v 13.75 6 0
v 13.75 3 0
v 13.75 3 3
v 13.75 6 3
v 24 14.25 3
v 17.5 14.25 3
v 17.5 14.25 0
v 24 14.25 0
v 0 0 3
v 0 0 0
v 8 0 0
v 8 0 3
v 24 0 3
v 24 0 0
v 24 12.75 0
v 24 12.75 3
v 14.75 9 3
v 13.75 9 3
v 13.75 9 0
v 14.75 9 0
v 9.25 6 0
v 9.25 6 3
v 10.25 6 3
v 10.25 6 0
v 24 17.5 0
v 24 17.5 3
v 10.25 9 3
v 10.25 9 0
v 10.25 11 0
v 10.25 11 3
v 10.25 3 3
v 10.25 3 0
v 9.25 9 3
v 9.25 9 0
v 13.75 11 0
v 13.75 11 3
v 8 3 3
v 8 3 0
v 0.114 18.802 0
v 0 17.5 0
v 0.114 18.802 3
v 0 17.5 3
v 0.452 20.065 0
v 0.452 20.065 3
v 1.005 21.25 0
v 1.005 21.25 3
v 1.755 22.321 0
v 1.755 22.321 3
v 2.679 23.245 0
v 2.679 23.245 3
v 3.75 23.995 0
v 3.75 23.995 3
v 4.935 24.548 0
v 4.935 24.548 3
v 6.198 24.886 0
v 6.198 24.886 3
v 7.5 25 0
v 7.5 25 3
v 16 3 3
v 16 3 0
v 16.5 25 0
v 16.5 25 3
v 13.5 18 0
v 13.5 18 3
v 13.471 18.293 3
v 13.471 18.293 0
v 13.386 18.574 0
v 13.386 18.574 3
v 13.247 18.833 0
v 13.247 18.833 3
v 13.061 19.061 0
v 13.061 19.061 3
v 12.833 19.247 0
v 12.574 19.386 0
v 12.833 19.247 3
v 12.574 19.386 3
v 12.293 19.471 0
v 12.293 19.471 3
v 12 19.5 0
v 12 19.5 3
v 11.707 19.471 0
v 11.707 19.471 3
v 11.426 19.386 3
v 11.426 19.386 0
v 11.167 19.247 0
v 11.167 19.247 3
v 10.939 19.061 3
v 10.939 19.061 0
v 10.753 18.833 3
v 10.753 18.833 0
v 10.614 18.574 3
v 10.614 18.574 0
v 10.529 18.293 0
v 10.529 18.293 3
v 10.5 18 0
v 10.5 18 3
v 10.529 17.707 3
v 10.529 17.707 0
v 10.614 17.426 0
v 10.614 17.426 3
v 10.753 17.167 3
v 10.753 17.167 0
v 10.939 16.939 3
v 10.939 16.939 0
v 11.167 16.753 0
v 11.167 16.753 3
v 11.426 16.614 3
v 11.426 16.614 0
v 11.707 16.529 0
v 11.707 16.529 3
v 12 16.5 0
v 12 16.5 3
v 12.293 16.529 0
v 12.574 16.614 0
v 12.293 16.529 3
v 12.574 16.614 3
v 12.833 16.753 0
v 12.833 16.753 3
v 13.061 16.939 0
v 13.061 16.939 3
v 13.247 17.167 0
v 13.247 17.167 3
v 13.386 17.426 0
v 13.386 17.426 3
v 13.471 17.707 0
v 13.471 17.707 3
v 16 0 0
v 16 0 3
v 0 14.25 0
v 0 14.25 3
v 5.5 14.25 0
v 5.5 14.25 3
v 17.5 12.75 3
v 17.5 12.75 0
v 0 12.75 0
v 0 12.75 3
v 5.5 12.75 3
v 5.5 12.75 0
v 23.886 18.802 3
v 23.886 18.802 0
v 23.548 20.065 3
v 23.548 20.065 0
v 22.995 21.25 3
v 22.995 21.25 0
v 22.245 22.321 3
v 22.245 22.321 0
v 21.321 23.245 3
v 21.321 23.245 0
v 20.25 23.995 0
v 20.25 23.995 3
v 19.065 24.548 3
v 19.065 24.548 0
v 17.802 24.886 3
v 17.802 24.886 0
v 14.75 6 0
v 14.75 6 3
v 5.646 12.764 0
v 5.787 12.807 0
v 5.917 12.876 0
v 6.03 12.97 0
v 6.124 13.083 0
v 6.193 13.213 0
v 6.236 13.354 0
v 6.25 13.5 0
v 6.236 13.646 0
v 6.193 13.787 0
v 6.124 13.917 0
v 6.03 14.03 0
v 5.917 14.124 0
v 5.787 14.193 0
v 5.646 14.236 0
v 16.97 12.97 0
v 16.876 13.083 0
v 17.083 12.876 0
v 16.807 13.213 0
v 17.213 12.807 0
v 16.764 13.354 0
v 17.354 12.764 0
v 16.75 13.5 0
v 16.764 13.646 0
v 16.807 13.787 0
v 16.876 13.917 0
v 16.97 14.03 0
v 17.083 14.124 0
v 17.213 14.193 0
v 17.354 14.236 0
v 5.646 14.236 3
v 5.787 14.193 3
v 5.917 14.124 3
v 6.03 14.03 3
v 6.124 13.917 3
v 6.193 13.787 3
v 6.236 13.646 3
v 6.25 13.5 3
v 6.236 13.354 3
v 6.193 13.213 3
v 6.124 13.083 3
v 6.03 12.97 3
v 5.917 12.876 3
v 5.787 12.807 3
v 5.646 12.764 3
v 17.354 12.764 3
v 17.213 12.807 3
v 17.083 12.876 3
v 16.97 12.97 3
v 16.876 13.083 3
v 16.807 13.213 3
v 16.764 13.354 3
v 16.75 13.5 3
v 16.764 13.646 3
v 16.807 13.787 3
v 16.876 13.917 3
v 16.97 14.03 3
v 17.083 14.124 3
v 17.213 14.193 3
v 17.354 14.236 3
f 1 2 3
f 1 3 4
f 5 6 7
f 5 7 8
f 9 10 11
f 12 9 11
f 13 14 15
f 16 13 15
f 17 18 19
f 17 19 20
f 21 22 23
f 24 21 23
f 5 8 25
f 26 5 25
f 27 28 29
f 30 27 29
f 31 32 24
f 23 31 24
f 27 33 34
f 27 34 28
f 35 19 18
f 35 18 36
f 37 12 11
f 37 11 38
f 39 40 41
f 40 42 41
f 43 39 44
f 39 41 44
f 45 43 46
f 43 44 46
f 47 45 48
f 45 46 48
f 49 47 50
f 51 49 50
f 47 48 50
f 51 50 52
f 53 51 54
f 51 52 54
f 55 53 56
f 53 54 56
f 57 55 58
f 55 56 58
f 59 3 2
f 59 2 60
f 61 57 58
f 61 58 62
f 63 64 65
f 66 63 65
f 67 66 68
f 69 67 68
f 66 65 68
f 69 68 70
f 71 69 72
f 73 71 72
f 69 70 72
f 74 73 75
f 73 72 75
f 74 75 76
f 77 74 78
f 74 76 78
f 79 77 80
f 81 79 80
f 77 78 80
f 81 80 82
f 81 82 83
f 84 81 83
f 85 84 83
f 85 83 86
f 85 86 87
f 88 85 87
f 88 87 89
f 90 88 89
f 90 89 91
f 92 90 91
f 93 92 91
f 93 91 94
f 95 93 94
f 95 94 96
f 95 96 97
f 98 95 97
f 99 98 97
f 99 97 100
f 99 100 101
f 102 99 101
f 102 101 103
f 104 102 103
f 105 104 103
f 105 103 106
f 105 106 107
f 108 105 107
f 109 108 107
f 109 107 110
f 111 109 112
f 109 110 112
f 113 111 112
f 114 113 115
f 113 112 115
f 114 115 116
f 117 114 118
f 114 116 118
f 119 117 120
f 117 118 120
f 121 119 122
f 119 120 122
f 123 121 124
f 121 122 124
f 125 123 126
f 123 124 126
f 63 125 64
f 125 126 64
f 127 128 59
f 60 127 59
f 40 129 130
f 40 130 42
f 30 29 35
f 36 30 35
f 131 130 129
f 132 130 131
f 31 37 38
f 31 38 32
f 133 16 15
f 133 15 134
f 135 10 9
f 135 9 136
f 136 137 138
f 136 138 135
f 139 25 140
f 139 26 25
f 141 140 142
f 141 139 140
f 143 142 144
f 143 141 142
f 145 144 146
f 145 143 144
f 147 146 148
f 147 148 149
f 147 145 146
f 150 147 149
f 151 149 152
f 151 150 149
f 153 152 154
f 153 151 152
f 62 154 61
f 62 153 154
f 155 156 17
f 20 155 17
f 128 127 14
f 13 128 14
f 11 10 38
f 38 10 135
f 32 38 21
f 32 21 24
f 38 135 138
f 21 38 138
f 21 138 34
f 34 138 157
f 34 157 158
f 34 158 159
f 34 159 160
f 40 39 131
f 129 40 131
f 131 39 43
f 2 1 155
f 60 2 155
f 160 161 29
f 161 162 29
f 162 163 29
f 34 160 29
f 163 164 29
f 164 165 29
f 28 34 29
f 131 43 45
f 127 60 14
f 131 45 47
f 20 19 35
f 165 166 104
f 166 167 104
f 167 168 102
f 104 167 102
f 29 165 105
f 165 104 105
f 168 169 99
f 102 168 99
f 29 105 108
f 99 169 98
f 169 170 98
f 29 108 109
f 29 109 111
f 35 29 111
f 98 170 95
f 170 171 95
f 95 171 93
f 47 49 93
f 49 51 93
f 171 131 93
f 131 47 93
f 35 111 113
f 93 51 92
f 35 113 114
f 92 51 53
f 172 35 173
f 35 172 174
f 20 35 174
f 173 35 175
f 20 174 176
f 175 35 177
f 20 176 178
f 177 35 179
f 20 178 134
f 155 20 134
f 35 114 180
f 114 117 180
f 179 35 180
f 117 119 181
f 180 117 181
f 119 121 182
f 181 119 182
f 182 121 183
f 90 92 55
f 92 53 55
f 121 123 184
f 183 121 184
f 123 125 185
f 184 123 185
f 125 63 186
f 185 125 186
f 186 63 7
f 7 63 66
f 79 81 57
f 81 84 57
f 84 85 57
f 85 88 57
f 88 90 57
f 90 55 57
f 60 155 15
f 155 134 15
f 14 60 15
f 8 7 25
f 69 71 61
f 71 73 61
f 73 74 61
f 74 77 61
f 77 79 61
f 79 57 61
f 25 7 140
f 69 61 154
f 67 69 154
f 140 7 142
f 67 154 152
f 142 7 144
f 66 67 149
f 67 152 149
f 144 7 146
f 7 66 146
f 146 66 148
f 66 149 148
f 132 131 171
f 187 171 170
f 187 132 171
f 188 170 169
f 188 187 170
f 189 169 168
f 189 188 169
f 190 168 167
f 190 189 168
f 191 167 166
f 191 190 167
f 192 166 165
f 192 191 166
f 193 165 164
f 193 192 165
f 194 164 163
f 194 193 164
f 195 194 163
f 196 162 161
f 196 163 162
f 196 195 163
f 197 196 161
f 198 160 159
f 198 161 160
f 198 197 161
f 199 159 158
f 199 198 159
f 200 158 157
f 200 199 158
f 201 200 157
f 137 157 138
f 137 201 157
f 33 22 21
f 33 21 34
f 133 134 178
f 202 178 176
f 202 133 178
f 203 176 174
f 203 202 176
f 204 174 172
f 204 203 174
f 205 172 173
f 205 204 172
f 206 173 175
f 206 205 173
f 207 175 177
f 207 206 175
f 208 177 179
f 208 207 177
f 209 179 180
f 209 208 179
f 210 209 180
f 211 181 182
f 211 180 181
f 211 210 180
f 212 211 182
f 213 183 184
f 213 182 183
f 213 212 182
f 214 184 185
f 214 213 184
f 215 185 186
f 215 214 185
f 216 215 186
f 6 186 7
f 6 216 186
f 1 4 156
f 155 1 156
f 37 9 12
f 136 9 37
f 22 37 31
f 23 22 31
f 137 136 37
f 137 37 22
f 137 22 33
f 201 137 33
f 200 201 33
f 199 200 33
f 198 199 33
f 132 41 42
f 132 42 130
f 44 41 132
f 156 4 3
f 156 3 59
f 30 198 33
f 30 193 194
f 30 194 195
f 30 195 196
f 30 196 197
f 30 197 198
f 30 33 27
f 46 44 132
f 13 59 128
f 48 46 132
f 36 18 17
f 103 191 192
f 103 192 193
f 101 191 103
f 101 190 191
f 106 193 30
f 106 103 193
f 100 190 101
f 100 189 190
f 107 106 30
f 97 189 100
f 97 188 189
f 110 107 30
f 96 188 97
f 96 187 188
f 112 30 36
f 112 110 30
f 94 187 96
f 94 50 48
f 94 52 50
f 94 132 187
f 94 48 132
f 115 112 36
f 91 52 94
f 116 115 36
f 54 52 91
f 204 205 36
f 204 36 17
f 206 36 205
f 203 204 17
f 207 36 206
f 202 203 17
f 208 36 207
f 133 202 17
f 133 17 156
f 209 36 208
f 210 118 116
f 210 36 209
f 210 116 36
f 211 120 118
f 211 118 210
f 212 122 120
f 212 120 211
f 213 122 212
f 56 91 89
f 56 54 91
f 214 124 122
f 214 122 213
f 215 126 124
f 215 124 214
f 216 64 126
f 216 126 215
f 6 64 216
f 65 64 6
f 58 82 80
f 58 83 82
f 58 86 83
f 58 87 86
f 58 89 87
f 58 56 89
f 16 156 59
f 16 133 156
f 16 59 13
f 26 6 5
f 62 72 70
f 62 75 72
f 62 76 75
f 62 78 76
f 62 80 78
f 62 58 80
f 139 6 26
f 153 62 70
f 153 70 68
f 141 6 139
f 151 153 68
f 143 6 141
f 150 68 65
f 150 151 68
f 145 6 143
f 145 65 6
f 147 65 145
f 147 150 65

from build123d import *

# Parameters (mm, degrees)
ESQUISSE1_W             = 24
ESQUISSE1_H             = 25
BOSS_EXTRU_1_DEPTH      = 3
CONG_3_R                = 7.5
ENL_V_MAT_EXTRU_1_REACH = 36.785
ESQUISSE2_R             = 1.5
ENL_V_MAT_EXTRU_2_REACH = 36.785
ESQUISSE3_W             = 8
ESQUISSE3_H             = 3
ENL_V_MAT_EXTRU_3_REACH = 36.785
ESQUISSE4_W             = 5.5
ESQUISSE4_H             = 3
ENL_V_START             = -3
ESQUISSE5_W             = 3.5
ESQUISSE5_H             = 11
ENL_V_MAT_EXTRU_4_DEPTH = 3
ENL_V_MAT_EXTRU_5_REACH = 36.785
ENL_V_MAT_EXTRU_6_REACH = 36.785


with BuildPart() as part:
    # Esquisse1 → Boss.-Extru.1 (new body)
    with BuildSketch(Plane.XY):
        with Locations((12, 12.5)):
            Rectangle(ESQUISSE1_W, ESQUISSE1_H)
    extrude(amount=BOSS_EXTRU_1_DEPTH)

    # Congé3
    cong_3_edges = [part.edges().sort_by_distance(p)[0] for p in [
        (0, 25, 1.5),
        (24, 25, 1.5),
    ]]
    fillet(cong_3_edges, radius=CONG_3_R)

    # Esquisse2 → Enlèv. mat.-Extru.1 (cut, up to next)
    with BuildSketch(Plane.XY.offset(3), mode=Mode.PRIVATE) as enl_v_mat_extru_1_sk1:
        with Locations((12, 18)):
            Circle(ESQUISSE2_R)
    enl_v_mat_extru_1_tool1 = extrude(enl_v_mat_extru_1_sk1.sketch, amount=-ENL_V_MAT_EXTRU_1_REACH, mode=Mode.PRIVATE) & part.part
    add(enl_v_mat_extru_1_tool1.solids().sort_by_distance((12, 18, 3))[0], mode=Mode.SUBTRACT)

    # Esquisse3 → Enlèv. mat.-Extru.2 (cut, up to next)
    with BuildSketch(Plane.XY.offset(3), mode=Mode.PRIVATE) as enl_v_mat_extru_2_sk1:
        with Locations((12, 1.5)):
            Rectangle(ESQUISSE3_W, ESQUISSE3_H)
    enl_v_mat_extru_2_tool1 = extrude(enl_v_mat_extru_2_sk1.sketch, amount=-ENL_V_MAT_EXTRU_2_REACH, mode=Mode.PRIVATE) & part.part
    add(enl_v_mat_extru_2_tool1.solids().sort_by_distance((12, 1.5, 3))[0], mode=Mode.SUBTRACT)

    # Esquisse4 → Enlèv. mat.-Extru.3 (cut, up to next)
    with BuildSketch(Plane.XY.offset(3), mode=Mode.PRIVATE) as enl_v_mat_extru_3_sk1:
        with Locations((12, 7.5)):
            Rectangle(ESQUISSE4_W, ESQUISSE4_H)
    enl_v_mat_extru_3_tool1 = extrude(enl_v_mat_extru_3_sk1.sketch, amount=-ENL_V_MAT_EXTRU_3_REACH, mode=Mode.PRIVATE) & part.part
    add(enl_v_mat_extru_3_tool1.solids().sort_by_distance((12, 7.5, 3))[0], mode=Mode.SUBTRACT)

    # Esquisse5 → Enlèv. mat.-Extru.4 (cut)
    with BuildSketch(Plane.XY.offset(3).offset(ENL_V_START)):
        with Locations((12, 5.5)):
            Rectangle(ESQUISSE5_W, ESQUISSE5_H)
    extrude(amount=ENL_V_MAT_EXTRU_4_DEPTH, mode=Mode.SUBTRACT)

    # Esquisse6 → Enlèv. mat.-Extru.5 (cut, up to next)
    with BuildSketch(Plane.XY.offset(3), mode=Mode.PRIVATE) as enl_v_mat_extru_5_sk1:
        with BuildLine():
            Line((17.5, 14.25), (30.5, 14.25))
            ThreePointArc((30.5, 14.25), (31.25, 13.5), (30.5, 12.75))
            Line((30.5, 12.75), (17.5, 12.75))
            ThreePointArc((17.5, 12.75), (16.75, 13.5), (17.5, 14.25))
        make_face()
    enl_v_mat_extru_5_tool1 = extrude(enl_v_mat_extru_5_sk1.sketch, amount=-ENL_V_MAT_EXTRU_5_REACH, mode=Mode.PRIVATE) & part.part
    add(enl_v_mat_extru_5_tool1.solids().sort_by_distance((24, 13.5, 3))[0], mode=Mode.SUBTRACT)

    # Esquisse7 → Enlèv. mat.-Extru.6 (cut, up to next)
    with BuildSketch(Plane.XY.offset(3), mode=Mode.PRIVATE) as enl_v_mat_extru_6_sk1:
        with BuildLine():
            Line((-5.5, 14.25), (5.5, 14.25))
            ThreePointArc((5.5, 14.25), (6.25, 13.5), (5.5, 12.75))
            Line((5.5, 12.75), (-5.5, 12.75))
            ThreePointArc((-5.5, 12.75), (-6.25, 13.5), (-5.5, 14.25))
        make_face()
    enl_v_mat_extru_6_tool1 = extrude(enl_v_mat_extru_6_sk1.sketch, amount=-ENL_V_MAT_EXTRU_6_REACH, mode=Mode.PRIVATE) & part.part
    add(enl_v_mat_extru_6_tool1.solids().sort_by_distance((0, 13.5, 3))[0], mode=Mode.SUBTRACT)


solid = part.part
